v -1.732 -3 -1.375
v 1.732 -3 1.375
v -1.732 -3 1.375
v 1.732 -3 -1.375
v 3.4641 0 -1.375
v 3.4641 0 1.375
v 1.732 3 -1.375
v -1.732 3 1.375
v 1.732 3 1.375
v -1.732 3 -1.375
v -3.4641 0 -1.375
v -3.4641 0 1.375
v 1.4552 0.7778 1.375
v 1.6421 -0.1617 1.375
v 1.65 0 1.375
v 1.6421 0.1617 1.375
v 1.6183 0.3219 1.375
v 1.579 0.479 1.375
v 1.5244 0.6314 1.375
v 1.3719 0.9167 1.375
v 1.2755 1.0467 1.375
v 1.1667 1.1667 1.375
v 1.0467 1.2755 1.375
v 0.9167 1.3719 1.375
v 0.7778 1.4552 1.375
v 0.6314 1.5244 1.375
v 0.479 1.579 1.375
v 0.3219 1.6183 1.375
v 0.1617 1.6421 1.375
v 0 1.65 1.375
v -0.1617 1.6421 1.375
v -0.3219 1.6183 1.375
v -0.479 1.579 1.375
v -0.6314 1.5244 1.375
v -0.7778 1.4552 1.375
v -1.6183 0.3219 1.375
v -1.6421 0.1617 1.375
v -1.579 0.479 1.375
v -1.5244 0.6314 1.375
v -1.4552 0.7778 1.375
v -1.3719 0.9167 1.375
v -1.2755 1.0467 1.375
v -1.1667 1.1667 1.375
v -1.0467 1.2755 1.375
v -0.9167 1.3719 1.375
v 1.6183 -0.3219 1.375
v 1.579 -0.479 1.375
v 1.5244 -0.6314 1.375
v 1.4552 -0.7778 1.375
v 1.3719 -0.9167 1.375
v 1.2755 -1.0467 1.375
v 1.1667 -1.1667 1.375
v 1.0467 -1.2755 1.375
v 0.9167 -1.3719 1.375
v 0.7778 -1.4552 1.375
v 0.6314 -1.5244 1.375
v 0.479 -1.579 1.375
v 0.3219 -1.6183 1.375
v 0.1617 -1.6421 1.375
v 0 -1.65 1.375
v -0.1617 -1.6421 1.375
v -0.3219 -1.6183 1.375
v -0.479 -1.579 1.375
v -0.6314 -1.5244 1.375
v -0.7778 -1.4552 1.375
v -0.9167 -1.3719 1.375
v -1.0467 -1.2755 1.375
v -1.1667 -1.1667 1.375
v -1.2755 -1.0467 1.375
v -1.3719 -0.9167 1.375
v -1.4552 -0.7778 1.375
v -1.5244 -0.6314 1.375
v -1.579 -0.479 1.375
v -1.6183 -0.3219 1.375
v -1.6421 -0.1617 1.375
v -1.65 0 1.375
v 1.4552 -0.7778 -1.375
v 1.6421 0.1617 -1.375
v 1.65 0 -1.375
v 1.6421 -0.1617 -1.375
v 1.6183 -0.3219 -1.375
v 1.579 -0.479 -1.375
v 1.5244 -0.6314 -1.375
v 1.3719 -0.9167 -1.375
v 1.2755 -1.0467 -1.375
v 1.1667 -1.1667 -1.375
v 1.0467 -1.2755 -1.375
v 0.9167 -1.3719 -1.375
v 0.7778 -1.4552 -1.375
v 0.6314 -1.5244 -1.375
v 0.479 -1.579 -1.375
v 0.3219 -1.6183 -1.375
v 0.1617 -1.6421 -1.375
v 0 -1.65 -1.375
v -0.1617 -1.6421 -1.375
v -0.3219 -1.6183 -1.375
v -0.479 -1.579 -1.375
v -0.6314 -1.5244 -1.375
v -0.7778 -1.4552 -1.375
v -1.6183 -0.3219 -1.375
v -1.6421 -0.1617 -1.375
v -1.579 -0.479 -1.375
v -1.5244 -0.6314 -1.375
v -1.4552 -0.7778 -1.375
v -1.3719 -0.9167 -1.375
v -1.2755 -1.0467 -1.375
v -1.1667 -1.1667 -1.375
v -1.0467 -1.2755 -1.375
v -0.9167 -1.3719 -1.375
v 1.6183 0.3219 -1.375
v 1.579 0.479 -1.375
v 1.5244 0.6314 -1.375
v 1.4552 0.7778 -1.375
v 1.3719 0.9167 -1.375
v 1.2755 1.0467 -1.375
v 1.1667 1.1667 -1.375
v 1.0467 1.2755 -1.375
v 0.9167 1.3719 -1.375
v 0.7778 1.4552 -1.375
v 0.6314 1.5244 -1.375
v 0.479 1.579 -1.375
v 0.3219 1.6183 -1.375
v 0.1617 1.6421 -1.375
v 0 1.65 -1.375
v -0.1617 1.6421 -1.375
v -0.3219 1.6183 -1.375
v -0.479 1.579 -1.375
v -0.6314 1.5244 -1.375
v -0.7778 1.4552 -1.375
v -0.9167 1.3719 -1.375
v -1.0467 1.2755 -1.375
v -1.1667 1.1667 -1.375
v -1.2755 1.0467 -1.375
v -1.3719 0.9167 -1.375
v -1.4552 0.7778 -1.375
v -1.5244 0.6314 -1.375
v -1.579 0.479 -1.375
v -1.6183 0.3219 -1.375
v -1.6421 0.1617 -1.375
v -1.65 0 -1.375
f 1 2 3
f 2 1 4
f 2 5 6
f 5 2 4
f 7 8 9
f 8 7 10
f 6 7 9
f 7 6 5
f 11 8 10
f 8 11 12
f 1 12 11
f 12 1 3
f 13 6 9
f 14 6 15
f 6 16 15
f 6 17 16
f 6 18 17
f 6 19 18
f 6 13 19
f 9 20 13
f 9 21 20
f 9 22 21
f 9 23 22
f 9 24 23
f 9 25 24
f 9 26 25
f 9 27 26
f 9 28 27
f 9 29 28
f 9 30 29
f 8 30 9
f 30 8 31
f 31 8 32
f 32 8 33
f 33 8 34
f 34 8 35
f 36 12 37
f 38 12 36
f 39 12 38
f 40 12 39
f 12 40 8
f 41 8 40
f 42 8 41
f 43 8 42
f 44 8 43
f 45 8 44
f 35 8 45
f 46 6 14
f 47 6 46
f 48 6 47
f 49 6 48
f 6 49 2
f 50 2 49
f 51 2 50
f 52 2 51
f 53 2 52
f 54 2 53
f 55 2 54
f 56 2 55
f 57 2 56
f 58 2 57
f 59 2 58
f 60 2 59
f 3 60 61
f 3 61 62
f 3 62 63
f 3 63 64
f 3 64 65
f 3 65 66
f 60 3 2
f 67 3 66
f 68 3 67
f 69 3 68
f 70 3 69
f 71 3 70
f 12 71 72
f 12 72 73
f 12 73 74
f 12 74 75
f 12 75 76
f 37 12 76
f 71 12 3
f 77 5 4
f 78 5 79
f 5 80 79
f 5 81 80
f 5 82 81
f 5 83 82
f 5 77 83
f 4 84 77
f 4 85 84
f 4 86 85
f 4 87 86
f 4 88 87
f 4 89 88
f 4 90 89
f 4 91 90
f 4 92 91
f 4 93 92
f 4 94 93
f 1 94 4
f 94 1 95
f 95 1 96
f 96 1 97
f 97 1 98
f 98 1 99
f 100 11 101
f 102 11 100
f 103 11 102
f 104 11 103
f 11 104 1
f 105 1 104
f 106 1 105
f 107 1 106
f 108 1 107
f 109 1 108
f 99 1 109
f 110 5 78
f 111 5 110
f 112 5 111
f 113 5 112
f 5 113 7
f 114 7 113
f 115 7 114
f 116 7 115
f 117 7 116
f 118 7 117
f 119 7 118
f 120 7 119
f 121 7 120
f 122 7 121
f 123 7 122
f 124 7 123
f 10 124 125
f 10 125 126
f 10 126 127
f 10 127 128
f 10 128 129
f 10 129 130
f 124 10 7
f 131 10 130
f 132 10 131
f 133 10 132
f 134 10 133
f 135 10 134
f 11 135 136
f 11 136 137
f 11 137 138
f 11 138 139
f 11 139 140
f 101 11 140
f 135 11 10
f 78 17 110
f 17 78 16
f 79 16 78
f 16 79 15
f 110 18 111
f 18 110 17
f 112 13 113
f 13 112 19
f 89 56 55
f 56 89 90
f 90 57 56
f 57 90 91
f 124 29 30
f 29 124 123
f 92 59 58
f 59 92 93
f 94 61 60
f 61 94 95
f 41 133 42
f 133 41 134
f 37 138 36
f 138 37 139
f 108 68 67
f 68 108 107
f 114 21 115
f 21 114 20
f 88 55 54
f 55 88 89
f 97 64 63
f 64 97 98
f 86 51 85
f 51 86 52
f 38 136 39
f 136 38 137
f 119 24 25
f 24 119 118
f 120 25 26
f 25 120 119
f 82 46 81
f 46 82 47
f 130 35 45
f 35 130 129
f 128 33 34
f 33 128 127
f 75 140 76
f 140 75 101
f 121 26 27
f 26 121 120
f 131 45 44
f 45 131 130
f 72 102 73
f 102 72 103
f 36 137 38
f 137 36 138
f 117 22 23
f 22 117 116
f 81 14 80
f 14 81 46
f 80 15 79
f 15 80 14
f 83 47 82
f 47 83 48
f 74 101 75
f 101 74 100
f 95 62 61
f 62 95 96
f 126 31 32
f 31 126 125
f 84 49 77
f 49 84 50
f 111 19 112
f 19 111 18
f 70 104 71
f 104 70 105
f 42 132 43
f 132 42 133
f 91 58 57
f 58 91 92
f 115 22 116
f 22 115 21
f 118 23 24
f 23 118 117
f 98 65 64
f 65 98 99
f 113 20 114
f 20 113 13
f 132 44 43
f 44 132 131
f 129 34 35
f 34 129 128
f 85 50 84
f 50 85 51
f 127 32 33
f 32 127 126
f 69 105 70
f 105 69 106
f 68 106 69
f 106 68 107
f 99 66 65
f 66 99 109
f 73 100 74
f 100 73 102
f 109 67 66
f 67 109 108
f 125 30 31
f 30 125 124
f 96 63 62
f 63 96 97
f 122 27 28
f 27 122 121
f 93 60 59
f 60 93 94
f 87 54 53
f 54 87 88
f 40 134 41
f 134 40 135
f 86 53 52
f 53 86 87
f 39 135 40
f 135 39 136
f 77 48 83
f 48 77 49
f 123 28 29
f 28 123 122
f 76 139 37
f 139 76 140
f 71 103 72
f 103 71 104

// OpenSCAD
$fn=64;

screw_d = 3.0;
across_flats = 6.0;
thickness = 2.75;

clearance = 0.3;
hole_d = screw_d + clearance;

module hex_prism(af, h){
    r = af / sqrt(3);
    cylinder(h=h, r=r, center=true, $fn=6);
}

module tslot_nut(){
    difference(){
        hex_prism(across_flats, thickness);
        cylinder(h=thickness + 0.6, d=hole_d, center=true, $fn=64);
    }
}

tslot_nut();
